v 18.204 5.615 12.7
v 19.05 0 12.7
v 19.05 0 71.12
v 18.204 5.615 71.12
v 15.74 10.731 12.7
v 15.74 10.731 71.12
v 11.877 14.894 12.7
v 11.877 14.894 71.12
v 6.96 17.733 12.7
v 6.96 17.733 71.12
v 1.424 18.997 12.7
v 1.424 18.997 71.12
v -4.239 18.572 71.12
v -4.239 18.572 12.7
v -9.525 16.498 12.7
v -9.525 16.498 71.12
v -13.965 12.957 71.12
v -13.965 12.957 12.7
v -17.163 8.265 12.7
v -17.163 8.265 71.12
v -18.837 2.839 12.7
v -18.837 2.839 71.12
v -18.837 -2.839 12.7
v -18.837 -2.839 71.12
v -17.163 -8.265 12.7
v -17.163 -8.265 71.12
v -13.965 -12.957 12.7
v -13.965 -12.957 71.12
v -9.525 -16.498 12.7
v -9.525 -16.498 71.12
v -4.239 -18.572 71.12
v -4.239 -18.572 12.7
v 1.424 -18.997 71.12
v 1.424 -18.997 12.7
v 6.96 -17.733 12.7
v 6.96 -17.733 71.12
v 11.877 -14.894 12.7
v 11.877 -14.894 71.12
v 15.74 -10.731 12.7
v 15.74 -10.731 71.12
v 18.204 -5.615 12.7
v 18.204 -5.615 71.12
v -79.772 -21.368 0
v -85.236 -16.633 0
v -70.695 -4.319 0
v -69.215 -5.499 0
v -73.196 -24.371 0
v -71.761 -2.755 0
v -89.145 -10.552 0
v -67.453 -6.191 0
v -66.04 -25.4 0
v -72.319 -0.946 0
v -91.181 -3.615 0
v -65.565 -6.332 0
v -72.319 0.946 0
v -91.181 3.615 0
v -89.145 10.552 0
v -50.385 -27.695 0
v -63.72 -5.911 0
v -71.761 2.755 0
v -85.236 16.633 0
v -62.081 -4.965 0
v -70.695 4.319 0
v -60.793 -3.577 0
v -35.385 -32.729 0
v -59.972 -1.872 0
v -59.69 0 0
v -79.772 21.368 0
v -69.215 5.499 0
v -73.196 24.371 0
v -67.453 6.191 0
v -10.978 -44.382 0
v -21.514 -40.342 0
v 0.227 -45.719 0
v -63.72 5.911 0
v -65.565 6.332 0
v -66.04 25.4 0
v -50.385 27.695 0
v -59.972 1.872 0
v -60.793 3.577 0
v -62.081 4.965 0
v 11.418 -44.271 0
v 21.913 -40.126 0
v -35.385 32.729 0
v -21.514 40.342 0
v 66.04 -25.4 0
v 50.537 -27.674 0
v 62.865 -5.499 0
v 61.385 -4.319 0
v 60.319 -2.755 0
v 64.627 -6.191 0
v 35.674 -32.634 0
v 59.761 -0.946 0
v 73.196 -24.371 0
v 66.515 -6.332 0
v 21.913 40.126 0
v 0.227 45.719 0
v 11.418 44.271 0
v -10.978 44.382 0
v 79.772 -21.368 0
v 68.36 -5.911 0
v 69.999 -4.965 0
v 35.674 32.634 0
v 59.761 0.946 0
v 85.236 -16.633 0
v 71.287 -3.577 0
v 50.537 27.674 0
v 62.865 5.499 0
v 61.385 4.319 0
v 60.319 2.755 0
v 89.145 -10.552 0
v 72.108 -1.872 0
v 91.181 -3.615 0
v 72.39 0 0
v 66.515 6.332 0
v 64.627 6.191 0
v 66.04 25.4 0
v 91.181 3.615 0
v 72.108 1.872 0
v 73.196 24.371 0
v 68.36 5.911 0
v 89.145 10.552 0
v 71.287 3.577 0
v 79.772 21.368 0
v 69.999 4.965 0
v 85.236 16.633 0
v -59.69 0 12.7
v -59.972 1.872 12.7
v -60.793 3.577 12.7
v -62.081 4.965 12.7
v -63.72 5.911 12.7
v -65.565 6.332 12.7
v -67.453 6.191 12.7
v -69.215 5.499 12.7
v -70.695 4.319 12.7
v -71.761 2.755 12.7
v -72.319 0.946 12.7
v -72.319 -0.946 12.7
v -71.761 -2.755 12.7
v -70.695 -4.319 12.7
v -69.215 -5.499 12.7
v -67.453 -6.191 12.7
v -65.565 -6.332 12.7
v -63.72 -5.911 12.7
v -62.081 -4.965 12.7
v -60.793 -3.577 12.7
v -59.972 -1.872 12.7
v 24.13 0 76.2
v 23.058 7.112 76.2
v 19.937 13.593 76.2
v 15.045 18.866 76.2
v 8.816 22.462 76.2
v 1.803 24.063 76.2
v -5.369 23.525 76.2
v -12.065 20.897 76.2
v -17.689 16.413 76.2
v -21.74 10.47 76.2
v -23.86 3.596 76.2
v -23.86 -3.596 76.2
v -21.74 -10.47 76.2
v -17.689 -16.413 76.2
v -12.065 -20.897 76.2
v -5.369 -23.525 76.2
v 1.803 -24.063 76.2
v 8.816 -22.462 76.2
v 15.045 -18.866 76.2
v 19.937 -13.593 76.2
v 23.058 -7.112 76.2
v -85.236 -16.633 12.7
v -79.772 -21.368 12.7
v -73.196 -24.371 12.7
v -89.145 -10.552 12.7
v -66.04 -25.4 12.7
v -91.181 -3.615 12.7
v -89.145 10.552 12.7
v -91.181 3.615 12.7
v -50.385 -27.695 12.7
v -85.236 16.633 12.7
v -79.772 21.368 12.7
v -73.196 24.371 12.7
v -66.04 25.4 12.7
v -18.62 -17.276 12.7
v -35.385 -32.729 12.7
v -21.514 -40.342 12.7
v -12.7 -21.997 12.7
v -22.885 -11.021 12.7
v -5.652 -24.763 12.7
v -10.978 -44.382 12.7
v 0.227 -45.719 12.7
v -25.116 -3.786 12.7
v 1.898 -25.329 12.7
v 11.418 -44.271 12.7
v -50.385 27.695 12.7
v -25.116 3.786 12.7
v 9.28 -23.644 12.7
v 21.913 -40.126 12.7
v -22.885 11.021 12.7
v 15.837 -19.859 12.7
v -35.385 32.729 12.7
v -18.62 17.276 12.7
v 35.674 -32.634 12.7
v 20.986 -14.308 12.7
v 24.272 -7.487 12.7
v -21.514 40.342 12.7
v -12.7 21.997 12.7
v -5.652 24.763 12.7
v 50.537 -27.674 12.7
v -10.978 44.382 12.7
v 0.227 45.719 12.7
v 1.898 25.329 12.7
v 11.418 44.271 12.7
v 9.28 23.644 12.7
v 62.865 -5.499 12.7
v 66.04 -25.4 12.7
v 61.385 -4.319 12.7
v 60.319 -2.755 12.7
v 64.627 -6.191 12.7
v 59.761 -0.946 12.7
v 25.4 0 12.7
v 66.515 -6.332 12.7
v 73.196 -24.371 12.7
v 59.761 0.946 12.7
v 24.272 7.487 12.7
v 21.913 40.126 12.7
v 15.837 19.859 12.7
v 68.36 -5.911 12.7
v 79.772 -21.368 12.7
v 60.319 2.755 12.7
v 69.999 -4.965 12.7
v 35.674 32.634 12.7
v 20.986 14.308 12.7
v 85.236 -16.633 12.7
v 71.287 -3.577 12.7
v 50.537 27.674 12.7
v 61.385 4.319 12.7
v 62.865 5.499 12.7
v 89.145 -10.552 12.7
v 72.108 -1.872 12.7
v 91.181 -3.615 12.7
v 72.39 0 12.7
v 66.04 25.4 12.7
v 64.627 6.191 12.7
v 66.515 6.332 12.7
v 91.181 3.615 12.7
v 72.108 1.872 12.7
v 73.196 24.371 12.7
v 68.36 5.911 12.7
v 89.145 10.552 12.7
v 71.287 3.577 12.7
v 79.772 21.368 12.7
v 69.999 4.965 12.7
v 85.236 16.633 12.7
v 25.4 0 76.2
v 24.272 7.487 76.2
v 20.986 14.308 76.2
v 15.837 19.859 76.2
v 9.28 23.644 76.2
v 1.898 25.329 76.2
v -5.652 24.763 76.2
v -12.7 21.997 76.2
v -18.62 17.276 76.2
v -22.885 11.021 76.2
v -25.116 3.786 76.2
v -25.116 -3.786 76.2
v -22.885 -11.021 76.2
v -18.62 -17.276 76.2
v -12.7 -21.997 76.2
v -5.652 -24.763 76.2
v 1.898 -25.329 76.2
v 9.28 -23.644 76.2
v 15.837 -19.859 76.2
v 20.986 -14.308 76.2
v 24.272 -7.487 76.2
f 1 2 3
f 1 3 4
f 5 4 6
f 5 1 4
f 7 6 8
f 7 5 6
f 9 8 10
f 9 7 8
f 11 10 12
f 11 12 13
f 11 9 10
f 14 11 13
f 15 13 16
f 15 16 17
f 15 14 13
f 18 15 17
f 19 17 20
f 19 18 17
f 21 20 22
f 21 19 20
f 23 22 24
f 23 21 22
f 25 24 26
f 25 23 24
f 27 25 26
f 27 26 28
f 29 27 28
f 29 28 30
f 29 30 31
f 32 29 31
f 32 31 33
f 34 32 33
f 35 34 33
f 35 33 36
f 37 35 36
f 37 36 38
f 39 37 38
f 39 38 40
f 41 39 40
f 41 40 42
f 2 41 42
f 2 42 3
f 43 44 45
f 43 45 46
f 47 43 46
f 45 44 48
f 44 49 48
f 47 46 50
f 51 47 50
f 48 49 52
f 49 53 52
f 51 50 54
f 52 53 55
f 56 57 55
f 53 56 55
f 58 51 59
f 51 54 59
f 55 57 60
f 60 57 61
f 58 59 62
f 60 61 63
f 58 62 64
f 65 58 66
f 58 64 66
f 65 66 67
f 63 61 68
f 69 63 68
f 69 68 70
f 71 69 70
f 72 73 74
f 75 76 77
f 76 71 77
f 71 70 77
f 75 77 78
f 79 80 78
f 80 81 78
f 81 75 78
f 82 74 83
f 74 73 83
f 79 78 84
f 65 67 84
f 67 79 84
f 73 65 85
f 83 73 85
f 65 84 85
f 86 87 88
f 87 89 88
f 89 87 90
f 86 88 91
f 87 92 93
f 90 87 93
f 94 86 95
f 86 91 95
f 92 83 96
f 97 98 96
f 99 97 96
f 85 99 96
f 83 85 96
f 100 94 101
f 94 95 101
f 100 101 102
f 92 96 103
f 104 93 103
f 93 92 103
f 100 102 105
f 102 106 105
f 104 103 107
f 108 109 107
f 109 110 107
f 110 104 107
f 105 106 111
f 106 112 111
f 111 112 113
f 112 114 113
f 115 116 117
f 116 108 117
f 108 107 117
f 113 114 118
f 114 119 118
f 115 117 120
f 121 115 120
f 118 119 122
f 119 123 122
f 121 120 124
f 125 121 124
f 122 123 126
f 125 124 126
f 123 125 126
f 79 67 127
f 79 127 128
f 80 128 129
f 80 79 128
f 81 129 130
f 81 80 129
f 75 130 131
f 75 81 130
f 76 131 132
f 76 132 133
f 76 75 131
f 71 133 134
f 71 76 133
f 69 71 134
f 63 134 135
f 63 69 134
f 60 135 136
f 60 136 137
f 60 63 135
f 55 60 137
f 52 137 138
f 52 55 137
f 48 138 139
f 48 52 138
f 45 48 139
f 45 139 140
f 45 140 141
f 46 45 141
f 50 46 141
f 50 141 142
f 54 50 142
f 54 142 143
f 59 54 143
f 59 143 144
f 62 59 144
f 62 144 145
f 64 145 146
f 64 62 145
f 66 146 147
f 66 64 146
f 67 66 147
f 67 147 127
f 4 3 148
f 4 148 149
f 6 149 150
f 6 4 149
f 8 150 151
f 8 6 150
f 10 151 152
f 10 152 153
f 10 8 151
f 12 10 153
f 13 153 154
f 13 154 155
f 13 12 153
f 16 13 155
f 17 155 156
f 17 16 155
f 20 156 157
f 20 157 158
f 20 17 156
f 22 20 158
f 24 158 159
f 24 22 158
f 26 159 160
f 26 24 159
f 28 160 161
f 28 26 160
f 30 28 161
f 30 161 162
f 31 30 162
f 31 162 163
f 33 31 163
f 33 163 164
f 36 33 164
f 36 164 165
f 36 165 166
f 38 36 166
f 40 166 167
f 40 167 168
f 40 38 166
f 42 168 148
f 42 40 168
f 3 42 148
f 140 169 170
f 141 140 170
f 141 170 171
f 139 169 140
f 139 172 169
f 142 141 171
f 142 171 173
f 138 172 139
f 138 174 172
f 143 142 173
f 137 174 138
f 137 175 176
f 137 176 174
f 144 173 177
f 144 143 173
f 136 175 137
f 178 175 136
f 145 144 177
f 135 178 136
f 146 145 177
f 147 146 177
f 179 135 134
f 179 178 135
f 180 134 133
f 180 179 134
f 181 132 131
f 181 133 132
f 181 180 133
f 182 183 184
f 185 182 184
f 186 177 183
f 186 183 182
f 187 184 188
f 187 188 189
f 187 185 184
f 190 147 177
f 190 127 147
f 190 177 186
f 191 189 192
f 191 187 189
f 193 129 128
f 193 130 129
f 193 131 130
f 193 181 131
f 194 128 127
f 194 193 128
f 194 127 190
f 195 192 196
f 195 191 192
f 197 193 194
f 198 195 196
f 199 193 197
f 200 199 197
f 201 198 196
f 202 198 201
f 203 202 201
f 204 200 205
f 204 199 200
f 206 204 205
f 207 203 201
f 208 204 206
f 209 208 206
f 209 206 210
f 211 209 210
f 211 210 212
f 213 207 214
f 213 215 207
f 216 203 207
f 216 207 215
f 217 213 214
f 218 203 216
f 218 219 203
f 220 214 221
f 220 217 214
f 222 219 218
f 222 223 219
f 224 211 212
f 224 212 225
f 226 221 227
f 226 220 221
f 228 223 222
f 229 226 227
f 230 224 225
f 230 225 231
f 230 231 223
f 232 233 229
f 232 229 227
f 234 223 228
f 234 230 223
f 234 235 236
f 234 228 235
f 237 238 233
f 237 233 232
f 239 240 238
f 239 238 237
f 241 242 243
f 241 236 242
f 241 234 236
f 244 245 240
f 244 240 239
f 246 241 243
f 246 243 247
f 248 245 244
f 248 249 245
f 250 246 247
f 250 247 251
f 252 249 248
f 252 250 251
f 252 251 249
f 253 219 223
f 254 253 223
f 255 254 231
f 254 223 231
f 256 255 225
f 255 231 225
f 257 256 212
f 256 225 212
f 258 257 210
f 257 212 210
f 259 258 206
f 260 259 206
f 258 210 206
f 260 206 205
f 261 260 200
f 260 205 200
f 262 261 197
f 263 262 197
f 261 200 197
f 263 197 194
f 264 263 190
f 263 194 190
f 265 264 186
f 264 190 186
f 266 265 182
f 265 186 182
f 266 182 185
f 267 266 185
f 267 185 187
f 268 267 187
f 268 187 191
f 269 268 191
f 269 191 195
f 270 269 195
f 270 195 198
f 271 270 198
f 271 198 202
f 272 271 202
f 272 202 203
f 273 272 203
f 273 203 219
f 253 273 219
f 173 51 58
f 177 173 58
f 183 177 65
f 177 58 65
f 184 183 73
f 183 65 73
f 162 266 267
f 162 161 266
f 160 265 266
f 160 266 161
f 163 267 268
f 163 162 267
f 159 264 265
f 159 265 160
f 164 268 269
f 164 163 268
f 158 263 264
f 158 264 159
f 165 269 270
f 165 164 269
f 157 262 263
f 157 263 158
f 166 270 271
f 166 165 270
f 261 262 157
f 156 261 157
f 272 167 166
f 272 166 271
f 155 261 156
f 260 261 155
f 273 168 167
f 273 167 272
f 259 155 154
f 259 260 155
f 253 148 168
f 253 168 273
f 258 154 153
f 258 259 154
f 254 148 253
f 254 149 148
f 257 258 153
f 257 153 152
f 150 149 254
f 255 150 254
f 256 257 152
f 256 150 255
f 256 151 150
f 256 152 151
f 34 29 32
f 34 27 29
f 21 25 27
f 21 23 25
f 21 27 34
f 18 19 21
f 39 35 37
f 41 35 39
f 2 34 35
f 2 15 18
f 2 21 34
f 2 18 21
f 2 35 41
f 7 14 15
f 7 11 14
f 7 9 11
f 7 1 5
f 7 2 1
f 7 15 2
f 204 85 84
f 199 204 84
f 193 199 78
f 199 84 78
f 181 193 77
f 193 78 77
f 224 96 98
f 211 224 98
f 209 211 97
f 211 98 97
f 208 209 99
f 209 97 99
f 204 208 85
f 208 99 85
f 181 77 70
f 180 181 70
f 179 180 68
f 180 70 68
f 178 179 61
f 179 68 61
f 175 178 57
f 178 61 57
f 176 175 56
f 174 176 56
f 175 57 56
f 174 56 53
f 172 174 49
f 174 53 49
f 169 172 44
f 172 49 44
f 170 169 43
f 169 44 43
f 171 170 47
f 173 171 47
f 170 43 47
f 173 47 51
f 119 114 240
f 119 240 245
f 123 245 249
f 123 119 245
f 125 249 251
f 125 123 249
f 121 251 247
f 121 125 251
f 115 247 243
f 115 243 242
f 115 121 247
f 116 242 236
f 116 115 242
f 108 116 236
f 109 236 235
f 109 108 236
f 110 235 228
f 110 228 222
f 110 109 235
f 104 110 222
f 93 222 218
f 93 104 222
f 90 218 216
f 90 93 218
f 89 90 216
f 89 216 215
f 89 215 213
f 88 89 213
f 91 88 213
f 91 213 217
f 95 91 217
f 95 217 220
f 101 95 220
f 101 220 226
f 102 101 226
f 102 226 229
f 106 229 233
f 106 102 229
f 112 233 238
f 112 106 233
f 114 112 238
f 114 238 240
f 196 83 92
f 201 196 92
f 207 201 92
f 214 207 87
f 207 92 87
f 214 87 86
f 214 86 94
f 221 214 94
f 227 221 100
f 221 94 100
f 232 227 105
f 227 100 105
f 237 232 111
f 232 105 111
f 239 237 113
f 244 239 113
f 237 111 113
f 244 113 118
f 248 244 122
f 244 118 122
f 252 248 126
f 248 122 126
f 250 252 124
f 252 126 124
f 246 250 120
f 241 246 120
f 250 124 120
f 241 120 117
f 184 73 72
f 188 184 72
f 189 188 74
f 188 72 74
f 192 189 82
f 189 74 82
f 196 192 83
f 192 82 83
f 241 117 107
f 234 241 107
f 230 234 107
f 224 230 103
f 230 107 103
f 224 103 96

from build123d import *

# Parameters (mm, degrees)
F0_R     = 6.35
F1_DEPTH = 12.7
F2_R     = 25.4
F2_R_2   = 19.05
F3_DEPTH = 76.2
F4_SIZE  = 5.08


with BuildPart() as f1:
    # F0 (on Top) → F1 (new body)
    with BuildSketch(Plane.XY):
        with BuildLine():
            ThreePointArc((-66.04, -25.4), (-42.772685, -29.877305), (-21.514457, -40.341623))
            ThreePointArc((-21.514457, -40.341623), (0.226525, -45.719439), (21.913151, -40.126453))
            ThreePointArc((21.913151, -40.126453), (42.996249, -29.825744), (66.04, -25.4))
            ThreePointArc((66.04, -25.4), (91.44, 0), (66.04, 25.4))
            ThreePointArc((66.04, 25.4), (42.996249, 29.825744), (21.913151, 40.126453))
            ThreePointArc((21.913151, 40.126453), (0.226525, 45.719439), (-21.514457, 40.341623))
            ThreePointArc((-21.514457, 40.341623), (-42.772685, 29.877305), (-66.04, 25.4))
            ThreePointArc((-66.04, 25.4), (-91.44, 0), (-66.04, -25.4))
        make_face()
        with Locations((-66.04, 0)):
            Circle(F0_R, mode=Mode.SUBTRACT)
        with Locations((66.04, 0)):
            Circle(F0_R, mode=Mode.SUBTRACT)
    extrude(amount=F1_DEPTH)

    # F2 (on Top) → F3 (join)
    with BuildSketch(Plane.XY):
        Circle(F2_R)
        Circle(F2_R_2, mode=Mode.SUBTRACT)
    extrude(amount=F3_DEPTH)

    # F4
    f4_edges = [f1.edges().sort_by_distance(p)[0] for p in [
        (-19.05, 0, 76.2),
    ]]
    chamfer(f4_edges, length=F4_SIZE)


solid = f1.part
